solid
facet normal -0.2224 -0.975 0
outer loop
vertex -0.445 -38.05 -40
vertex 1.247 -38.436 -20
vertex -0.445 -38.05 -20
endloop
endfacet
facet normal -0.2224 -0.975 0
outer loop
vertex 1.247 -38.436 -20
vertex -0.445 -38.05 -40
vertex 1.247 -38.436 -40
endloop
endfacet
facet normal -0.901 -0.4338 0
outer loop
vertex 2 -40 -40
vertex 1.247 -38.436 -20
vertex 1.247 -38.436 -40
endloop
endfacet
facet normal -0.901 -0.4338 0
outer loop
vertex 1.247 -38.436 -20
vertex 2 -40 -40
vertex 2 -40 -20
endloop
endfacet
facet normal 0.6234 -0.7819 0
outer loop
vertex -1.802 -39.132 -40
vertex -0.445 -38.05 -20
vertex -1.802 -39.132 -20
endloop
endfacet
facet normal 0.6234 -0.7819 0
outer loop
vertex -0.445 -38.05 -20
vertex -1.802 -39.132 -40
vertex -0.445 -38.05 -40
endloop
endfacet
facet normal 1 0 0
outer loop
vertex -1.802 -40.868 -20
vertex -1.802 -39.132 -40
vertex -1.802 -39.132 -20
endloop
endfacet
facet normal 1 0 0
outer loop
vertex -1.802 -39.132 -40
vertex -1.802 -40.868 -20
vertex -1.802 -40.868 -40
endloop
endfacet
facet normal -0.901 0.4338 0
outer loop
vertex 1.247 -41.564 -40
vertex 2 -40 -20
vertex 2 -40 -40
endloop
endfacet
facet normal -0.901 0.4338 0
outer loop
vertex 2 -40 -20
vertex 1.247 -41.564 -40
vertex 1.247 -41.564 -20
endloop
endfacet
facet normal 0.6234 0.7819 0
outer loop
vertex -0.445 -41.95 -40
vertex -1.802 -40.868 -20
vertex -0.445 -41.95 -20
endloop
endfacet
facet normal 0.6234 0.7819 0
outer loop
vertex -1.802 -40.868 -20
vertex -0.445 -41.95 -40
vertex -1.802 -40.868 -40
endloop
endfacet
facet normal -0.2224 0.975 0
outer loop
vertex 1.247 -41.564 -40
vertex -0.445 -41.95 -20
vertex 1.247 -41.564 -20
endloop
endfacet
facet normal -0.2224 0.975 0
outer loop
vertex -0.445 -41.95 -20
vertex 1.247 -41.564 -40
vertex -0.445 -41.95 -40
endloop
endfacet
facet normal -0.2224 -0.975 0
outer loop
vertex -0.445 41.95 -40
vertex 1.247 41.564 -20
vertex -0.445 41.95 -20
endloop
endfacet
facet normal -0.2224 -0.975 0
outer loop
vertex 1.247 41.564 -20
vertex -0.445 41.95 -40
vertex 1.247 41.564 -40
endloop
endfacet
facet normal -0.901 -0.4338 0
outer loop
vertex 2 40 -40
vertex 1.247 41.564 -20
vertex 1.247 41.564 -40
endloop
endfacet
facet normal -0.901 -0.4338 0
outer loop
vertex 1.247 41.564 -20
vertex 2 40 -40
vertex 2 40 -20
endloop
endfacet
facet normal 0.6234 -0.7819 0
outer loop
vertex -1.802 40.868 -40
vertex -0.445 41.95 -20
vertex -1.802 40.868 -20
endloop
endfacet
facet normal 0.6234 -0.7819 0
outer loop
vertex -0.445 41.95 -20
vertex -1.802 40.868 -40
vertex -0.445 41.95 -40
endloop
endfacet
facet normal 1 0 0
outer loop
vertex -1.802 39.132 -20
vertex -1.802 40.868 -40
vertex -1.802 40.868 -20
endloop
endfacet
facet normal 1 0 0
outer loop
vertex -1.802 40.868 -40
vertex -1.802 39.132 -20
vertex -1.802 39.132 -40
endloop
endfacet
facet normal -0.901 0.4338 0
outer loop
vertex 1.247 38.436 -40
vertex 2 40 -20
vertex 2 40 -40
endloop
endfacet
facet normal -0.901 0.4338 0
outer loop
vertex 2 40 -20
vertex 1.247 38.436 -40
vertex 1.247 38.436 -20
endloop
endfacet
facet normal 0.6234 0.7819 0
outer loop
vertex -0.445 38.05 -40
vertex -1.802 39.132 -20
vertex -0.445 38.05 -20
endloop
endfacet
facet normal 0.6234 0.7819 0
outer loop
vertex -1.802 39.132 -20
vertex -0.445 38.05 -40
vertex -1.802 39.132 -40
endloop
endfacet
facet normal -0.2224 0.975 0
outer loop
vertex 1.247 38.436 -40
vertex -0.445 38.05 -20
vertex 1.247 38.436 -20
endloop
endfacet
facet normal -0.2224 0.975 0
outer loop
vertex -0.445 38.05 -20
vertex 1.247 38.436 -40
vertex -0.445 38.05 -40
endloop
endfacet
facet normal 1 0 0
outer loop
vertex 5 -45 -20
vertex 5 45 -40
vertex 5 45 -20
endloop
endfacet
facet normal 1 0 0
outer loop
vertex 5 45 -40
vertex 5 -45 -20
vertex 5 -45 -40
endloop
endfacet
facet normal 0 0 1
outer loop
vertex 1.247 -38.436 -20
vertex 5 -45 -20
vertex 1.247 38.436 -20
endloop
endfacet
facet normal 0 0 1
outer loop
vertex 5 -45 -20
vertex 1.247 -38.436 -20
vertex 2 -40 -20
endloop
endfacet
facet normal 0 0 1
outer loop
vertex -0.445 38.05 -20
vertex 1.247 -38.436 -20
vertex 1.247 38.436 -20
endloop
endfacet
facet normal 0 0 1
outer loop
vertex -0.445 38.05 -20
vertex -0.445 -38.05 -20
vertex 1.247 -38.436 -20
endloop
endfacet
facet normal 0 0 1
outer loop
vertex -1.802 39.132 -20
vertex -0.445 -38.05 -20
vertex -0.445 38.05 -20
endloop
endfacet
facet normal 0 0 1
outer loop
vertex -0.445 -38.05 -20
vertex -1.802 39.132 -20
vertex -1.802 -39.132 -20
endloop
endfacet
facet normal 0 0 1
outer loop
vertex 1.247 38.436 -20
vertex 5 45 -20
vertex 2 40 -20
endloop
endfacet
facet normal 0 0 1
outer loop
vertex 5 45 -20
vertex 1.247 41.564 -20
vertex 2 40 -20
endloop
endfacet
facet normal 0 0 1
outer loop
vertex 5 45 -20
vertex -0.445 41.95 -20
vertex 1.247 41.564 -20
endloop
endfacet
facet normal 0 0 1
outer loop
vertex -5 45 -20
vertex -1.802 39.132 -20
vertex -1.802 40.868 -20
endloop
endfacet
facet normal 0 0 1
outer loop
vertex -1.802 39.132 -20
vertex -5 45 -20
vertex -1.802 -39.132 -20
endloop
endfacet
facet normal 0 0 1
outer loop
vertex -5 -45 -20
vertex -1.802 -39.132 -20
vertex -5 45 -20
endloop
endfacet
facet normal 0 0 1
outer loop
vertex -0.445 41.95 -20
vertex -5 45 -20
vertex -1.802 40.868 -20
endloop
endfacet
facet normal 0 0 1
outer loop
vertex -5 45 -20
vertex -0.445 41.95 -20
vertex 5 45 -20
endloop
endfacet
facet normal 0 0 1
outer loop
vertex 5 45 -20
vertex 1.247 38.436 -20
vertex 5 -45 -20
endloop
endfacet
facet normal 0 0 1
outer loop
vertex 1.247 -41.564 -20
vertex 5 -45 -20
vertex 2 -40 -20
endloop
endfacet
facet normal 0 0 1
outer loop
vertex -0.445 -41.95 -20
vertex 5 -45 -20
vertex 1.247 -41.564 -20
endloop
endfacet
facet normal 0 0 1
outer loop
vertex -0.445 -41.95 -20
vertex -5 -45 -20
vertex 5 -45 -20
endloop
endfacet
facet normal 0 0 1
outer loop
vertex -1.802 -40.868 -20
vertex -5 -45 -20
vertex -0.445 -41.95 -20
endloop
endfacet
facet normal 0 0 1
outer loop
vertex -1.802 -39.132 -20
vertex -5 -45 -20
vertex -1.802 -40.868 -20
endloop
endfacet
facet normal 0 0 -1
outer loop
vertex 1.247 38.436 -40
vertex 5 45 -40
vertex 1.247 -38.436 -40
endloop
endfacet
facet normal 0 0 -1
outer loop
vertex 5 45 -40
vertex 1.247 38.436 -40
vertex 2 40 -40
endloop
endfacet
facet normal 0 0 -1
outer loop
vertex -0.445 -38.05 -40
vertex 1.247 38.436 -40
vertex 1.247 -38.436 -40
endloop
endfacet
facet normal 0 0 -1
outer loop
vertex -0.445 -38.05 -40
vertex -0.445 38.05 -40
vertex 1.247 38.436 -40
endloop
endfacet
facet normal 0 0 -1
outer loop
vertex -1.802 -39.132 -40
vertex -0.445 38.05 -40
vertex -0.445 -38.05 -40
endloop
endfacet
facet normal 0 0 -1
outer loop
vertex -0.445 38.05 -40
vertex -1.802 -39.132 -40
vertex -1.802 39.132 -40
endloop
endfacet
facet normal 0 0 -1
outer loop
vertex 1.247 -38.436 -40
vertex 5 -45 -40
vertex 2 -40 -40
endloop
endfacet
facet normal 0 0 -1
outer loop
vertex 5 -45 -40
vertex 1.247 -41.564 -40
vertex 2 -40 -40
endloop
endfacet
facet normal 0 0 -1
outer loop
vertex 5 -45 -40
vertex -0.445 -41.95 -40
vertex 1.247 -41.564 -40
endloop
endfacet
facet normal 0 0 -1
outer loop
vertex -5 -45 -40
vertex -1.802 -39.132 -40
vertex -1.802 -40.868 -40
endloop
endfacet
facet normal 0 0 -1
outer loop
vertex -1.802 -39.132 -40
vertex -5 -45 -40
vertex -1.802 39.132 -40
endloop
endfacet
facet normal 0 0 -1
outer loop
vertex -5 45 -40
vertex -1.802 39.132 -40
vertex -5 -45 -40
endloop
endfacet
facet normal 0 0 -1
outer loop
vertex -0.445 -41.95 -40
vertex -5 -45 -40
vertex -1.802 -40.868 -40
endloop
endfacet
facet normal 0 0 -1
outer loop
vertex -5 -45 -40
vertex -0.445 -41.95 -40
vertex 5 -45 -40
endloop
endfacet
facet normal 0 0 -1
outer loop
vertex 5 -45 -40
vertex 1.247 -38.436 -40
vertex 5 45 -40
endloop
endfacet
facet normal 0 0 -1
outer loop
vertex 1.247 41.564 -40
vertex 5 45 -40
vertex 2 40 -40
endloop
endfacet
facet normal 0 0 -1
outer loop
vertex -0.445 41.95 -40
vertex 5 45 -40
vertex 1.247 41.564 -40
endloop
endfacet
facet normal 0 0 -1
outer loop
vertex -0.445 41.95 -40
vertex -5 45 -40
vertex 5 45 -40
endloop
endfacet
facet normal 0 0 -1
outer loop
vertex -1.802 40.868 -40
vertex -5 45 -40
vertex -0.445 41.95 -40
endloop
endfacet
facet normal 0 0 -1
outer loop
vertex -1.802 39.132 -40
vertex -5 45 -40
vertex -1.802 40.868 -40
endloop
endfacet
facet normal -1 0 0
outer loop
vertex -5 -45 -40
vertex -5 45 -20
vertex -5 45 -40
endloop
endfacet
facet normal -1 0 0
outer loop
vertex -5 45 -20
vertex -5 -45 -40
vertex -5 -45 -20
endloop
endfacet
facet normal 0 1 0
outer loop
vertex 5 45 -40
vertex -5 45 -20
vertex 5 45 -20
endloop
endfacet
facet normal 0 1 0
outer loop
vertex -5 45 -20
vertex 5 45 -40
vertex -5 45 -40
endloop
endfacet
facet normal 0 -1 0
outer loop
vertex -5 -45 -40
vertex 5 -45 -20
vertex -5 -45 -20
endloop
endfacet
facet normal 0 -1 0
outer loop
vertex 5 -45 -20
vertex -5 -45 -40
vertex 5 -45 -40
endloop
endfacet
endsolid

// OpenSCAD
// file: config.scad
e = 0.01;

// Real Sterilite Tote Size
//toteHeight = 125;
//toteTopWidth = 200;
//toteBottomWidth = 155;
//toteTopLength = 355;
//toteBottomLength = 300;

// Scaled Size
toteHeight = 30;
toteTopWidth = 60;
toteBottomWidth = 45;
toteTopLength = 105;
toteBottomLength = 90;

// Parameters
fingerHeight = 5;
fingerClearance = 5;

armatureHeight = 10;
armatureThickness = 20;

baseHeight = 20;
baseThickness = 10;

boltDiameter = 3;
pinDiameter = 4;

base2Height = 20;

totesPerRow = 3;
// main file
include <config.scad>;

module leg() {
  translate([0, 0, -base2Height/2 - baseHeight])
    difference() {
      cube([10, toteBottomLength, base2Height], center = true);
      for (y = [-1, 1])
        translate([0, y*(toteBottomWidth - baseThickness/2), 0])
          cylinder(d = pinDiameter, h = base2Height + 1, center = true);
    }
}

leg();
